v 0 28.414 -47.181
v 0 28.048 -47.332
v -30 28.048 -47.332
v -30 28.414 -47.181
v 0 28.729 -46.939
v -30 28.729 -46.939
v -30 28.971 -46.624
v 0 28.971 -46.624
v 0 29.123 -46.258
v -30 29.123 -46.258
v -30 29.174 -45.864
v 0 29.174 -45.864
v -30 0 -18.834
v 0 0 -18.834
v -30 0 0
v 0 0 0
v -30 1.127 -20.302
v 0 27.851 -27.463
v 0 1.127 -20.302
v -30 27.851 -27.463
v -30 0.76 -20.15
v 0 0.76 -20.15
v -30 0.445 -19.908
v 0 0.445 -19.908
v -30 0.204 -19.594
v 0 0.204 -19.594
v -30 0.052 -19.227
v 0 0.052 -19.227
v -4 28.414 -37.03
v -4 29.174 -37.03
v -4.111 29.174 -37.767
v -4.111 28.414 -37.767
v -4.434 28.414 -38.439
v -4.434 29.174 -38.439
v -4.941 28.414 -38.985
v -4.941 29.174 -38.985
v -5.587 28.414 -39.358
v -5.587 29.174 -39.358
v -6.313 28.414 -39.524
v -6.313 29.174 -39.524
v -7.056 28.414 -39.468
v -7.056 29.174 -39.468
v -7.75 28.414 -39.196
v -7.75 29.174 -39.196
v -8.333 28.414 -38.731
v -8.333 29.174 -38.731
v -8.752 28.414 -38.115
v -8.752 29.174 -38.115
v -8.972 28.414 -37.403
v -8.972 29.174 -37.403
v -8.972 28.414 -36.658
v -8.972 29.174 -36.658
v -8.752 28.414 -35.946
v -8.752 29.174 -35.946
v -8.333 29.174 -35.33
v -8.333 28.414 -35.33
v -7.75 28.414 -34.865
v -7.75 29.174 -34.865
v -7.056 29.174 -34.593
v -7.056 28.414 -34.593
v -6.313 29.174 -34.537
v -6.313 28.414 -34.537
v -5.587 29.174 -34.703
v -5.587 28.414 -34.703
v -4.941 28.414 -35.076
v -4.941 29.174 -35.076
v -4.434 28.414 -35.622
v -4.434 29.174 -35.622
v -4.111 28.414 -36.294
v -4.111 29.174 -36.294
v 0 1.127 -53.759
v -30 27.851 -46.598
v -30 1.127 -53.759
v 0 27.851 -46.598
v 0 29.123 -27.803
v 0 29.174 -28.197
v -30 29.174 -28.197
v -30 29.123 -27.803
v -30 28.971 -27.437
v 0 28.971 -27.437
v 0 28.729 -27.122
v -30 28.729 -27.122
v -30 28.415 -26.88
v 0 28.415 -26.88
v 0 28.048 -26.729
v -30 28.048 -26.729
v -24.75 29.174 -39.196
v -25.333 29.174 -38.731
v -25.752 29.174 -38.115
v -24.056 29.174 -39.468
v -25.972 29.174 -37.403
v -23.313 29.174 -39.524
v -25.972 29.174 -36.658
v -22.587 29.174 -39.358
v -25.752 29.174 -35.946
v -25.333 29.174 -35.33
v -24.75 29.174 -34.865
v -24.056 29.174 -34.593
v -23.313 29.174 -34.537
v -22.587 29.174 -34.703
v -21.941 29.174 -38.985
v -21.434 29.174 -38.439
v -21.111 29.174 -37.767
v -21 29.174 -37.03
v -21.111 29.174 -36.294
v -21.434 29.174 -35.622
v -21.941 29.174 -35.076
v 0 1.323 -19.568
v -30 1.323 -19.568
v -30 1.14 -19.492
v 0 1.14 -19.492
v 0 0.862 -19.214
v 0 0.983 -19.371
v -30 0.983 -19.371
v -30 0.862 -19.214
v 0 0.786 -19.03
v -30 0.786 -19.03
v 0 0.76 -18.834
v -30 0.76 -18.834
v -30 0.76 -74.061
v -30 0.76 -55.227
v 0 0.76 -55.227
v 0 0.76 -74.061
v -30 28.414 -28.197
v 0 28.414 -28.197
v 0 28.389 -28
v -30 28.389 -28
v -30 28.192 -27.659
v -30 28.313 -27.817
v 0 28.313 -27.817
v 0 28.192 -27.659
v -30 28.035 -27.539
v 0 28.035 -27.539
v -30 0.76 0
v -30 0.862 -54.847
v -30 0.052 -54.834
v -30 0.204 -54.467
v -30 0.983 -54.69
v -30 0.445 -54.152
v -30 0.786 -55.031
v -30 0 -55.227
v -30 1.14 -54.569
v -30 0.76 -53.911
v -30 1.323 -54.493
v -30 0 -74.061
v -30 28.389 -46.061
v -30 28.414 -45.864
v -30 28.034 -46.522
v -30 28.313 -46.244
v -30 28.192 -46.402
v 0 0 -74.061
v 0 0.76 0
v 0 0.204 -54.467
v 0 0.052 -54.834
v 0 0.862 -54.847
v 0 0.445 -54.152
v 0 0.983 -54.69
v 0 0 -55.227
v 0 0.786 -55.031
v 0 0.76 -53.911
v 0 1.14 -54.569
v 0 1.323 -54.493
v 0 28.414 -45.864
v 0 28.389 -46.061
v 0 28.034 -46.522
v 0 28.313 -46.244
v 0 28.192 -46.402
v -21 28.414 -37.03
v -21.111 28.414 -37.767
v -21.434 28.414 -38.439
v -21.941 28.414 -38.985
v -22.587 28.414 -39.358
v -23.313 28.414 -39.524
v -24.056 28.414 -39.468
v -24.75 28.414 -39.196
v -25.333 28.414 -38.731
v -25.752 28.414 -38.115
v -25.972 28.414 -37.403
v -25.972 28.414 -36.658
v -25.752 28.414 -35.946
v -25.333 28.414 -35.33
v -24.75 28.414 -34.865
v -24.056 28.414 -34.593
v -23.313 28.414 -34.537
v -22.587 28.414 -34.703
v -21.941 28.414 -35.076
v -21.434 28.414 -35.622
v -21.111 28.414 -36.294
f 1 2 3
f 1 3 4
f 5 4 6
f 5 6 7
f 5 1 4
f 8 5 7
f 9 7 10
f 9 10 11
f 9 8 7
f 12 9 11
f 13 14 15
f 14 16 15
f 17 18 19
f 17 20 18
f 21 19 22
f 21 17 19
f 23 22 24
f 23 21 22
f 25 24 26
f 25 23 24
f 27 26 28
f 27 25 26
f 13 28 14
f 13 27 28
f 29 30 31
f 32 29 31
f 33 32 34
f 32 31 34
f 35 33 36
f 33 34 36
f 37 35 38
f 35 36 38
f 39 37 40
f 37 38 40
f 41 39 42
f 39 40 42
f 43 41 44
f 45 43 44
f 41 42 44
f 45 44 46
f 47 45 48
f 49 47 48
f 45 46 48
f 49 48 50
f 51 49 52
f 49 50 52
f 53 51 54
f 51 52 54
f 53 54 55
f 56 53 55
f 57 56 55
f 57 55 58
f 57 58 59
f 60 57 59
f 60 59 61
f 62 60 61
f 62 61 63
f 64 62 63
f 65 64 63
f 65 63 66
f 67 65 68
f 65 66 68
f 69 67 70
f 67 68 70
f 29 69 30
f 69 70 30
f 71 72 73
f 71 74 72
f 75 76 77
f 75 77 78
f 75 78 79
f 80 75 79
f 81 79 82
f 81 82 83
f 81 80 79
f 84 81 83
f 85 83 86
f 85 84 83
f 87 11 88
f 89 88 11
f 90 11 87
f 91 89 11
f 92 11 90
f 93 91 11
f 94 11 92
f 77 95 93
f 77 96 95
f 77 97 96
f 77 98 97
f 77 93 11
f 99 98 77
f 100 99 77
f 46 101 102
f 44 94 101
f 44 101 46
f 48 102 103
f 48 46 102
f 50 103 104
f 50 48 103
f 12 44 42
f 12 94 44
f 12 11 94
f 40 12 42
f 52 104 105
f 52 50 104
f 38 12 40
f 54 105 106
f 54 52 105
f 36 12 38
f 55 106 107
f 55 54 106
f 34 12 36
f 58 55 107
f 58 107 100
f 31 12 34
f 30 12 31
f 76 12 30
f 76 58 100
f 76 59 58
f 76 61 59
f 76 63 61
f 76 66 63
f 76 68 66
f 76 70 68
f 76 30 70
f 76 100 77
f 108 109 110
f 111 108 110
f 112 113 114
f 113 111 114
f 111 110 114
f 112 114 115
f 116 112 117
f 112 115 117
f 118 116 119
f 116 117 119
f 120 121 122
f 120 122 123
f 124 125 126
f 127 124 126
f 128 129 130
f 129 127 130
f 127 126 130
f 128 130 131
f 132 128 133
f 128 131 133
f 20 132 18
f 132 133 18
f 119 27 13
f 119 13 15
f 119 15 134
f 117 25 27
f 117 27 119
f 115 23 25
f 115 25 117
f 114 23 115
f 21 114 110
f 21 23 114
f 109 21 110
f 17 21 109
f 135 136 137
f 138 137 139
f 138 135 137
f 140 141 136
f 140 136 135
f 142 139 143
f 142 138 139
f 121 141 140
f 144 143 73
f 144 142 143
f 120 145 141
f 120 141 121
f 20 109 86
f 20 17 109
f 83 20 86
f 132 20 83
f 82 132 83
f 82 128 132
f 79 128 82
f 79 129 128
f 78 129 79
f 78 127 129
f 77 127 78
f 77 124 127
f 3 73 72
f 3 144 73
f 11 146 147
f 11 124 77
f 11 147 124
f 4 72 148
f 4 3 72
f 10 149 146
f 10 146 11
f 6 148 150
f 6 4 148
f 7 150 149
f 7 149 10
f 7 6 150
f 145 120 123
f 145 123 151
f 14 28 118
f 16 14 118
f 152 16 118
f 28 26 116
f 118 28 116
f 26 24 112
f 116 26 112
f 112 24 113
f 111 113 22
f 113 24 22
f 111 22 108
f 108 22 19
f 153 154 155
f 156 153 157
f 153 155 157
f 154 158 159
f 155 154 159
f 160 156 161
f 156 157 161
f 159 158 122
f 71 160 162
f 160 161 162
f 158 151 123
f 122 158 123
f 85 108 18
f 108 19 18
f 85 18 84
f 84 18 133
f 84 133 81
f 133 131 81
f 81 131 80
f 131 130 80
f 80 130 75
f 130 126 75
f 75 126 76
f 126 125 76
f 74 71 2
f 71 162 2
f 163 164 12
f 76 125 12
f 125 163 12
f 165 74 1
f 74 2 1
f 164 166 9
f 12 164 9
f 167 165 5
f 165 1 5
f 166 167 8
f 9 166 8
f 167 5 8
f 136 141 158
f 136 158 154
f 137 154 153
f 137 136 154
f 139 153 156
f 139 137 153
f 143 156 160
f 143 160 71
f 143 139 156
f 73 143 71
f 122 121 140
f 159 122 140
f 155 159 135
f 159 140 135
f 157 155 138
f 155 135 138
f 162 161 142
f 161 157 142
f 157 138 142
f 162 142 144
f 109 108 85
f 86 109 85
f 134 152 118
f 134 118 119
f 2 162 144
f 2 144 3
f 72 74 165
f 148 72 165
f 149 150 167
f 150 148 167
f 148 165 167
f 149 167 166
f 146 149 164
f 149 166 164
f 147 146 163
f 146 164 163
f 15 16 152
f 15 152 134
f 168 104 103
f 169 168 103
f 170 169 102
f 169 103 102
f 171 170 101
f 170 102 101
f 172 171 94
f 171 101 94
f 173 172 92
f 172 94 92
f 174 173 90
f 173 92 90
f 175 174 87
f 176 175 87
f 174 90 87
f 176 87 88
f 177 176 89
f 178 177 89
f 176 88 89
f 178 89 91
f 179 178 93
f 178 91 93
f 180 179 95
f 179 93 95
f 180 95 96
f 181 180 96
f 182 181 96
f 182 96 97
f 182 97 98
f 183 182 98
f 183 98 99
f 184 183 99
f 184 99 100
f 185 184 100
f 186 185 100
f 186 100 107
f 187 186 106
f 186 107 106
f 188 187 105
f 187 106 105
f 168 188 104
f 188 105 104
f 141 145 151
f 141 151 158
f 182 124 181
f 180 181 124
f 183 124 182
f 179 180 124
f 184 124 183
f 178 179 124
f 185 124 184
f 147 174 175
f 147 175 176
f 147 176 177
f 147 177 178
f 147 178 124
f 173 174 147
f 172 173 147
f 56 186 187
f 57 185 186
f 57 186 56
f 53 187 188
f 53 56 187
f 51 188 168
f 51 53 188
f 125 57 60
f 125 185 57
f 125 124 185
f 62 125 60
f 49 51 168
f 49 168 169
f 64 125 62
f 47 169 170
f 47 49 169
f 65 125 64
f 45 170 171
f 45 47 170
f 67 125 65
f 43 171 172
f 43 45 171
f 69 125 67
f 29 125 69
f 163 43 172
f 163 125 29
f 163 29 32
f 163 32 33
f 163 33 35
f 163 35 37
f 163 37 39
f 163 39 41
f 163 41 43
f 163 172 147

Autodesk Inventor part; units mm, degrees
ref_plane "YZ Plane" through (0, 0, 0) normal (1, 0, 0) x (0, 1, 0)
ref_plane "XZ Plane" through (0, 0, 0) normal (0, 1, 0) x (-1, 0, 0)
ref_plane "XY Plane" through (0, 0, 0) normal (0, 0, 1) x (1, 0, 0)
sketch "Boceto1" plane through (0, 0, 0) normal (0, 1, 0) x (-1, 0, 0)
  point P0 (0, 0)
sketch "Boceto2" plane through (0, 0, 0) normal (0, 1, 0) x (-1, 0, 0)
  line L0 (0, 0) -> (30, 0)
  line L1 (30, 0) -> (30, -20)
  line L2 (30, -20) -> (0, -20)
  line L3 (0, -20) -> (0, 0)
  dimension "d0" = 30
  dimension "d1" = 20
extrude "Placa1" add sketch "Boceto2" along normal blind 0.76
sketch "Boceto3" plane through (0, 0.1967, -19.2659) normal (0, -0.258819, -0.9659258) x (-1, 0, 0)
  line L0 (30, 0) -> (0, 0)
  line L1 (0, 0) -> (0, -30)
  line L2 (0, -30) -> (30, -30)
  line L3 (30, -30) -> (30, 0)
edge flange "Pestaña1" height 30 angle -75 thickness 0.76 bend radius 0.76 thickness toward (0, -0.258819, -0.9659258) relief tear relief width 0.76 relief depth 0.38 edges at (-15, 0, -20) wall of the first edge with corners at (-30, 0.1967, -19.2659) (0, 0.1967, -19.2659) (0, 29.1745, -27.0305) (-30, 29.1745, -27.0305)
bend "Doblez1"
corner "Esquina1"
sketch "Boceto4" plane through (-30, 28.4145, -27.0305) normal (0, 1, 0) x (-1, 0, 0)
  line L0 (-30, 0) -> (0, 0)
  line L1 (0, 0) -> (0, 20)
  line L2 (0, 20) -> (-30, 20)
  line L3 (-30, 20) -> (-30, 0)
edge flange "Pestaña2" height 20 angle -75 thickness 0.76 bend radius 0.76 thickness toward (0, 1, 0) relief tear relief width 0.76 relief depth 0.38 edges at (-15, 29.1745, -27.0305) wall of the first edge with corners at (0, 28.4145, -27.0305) (-30, 28.4145, -27.0305) (-30, 28.4145, -47.0305) (0, 28.4145, -47.0305)
bend "Doblez2"
corner "Esquina2"
sketch "Boceto5" plane through (-30, 28.9778, -46.2964) normal (0, 0.258819, -0.9659258) x (1, 0, 0)
  line L0 (30, 0) -> (0, 0)
  line L1 (0, 0) -> (0, -30)
  line L2 (0, -30) -> (30, -30)
  line L3 (30, -30) -> (30, 0)
edge flange "Pestaña3" height 30 angle -75 thickness 0.76 bend radius 0.76 thickness toward (0, 0.258819, -0.9659258) relief tear relief width 0.76 relief depth 0.38 edges at (-15, 29.1745, -47.0305) wall of the first edge with corners at (0, 28.9778, -46.2964) (-30, 28.9778, -46.2964) (-30, 0, -54.0609) (0, 0, -54.0609)
bend "Doblez3"
corner "Esquina3"
sketch "Boceto6" plane through (0, 0.76, -54.0609) normal (0, -1, 0) x (1, 0, 0)
  line L0 (-30, 0) -> (0, 0)
  line L1 (0, 0) -> (0, 20)
  line L2 (0, 20) -> (-30, 20)
  line L3 (-30, 20) -> (-30, 0)
edge flange "Pestaña4" height 20 angle -75 thickness 0.76 bend radius 0.76 thickness toward (0, -1, 0) relief tear relief width 0.76 relief depth 0.38 edges at (-15, 0, -54.0609) wall of the first edge with corners at (-30, 0.76, -54.0609) (0, 0.76, -54.0609) (0, 0.76, -74.0609) (-30, 0.76, -74.0609)
bend "Doblez4"
corner "Esquina4"
sketch "Boceto7" plane through (-30, 29.1745, -28.1968) normal (0, 1, 0) x (1, 0, 0)
  circle A0 centre (6.5, 8.8337) radius 2.5
  circle A1 centre (23.5, 8.8337) radius 2.5
  line L0 (0, 0) -> (0, 17.6673) projected
  line L1 (30, 0) -> (30, 17.6673) projected
  point P0 (30, -28.1968)
  dimension "d43" = 5
  dimension "d44" = 5
  dimension "d45" = 6.5
  dimension "d46" = 6.5
extrude "Extrusión1" cut sketch "Boceto7" against normal through all
equation "\"d46\" = d45"
equation "\"d2\" = Grosor"
equation "\"d3\" = Anchura_desahogo_plegado"
equation "\"d4\" = Profundidad_desahogo_plegado"
equation "\"d5\" = Remanente_mínimo"
equation "\"d6\" = Radiodetransición"
equation "\"d9\" = Radio_pliegue"
equation "\"d10\" = Tamaño_destalonado"
equation "\"d11\" = TamañoSeparación"
equation "\"d12\" = Tamaño_de_radio_de_Jacobi"
equation "\"d13\" = Anchura_desahogo_plegado"
equation "\"d14\" = Profundidad_desahogo_plegado"
equation "\"d15\" = Remanente_mínimo"
equation "\"d16\" = Radiodetransición"
equation "\"d19\" = Radio_pliegue"
equation "\"d20\" = Tamaño_destalonado"
equation "\"d21\" = TamañoSeparación"
equation "\"d22\" = Tamaño_de_radio_de_Jacobi"
equation "\"d23\" = Anchura_desahogo_plegado"
equation "\"d24\" = Profundidad_desahogo_plegado"
equation "\"d25\" = Remanente_mínimo"
equation "\"d26\" = Radiodetransición"
equation "\"d29\" = Radio_pliegue"
equation "\"d30\" = Tamaño_destalonado"
equation "\"d31\" = TamañoSeparación"
equation "\"d32\" = Tamaño_de_radio_de_Jacobi"
equation "\"d33\" = Anchura_desahogo_plegado"
equation "\"d34\" = Profundidad_desahogo_plegado"
equation "\"d35\" = Remanente_mínimo"
equation "\"d36\" = Radiodetransición"
equation "\"d39\" = Radio_pliegue"
equation "\"d40\" = Tamaño_destalonado"
equation "\"d41\" = TamañoSeparación"
equation "\"d42\" = Tamaño_de_radio_de_Jacobi"
equation "\"Radio_pliegue\" = Grosor"
equation "\"Anchura_desahogo_plegado\" = Grosor"
equation "\"Profundidad_desahogo_plegado\" = 0.5 * Grosor"
equation "\"Tamaño_destalonado\" = 4 * Grosor"
equation "\"Remanente_mínimo\" = 2 * Grosor"
equation "\"Radiodetransición\" = Radio_pliegue"
equation "\"Tamaño_de_radio_de_Jacobi\" = Radio_pliegue"
equation "\"TamañoSeparación\" = Grosor"
equation "\"Grosor\" = 0.76"
properties part number "placa tierra" material "Acero AISI 1006 85 LC"
